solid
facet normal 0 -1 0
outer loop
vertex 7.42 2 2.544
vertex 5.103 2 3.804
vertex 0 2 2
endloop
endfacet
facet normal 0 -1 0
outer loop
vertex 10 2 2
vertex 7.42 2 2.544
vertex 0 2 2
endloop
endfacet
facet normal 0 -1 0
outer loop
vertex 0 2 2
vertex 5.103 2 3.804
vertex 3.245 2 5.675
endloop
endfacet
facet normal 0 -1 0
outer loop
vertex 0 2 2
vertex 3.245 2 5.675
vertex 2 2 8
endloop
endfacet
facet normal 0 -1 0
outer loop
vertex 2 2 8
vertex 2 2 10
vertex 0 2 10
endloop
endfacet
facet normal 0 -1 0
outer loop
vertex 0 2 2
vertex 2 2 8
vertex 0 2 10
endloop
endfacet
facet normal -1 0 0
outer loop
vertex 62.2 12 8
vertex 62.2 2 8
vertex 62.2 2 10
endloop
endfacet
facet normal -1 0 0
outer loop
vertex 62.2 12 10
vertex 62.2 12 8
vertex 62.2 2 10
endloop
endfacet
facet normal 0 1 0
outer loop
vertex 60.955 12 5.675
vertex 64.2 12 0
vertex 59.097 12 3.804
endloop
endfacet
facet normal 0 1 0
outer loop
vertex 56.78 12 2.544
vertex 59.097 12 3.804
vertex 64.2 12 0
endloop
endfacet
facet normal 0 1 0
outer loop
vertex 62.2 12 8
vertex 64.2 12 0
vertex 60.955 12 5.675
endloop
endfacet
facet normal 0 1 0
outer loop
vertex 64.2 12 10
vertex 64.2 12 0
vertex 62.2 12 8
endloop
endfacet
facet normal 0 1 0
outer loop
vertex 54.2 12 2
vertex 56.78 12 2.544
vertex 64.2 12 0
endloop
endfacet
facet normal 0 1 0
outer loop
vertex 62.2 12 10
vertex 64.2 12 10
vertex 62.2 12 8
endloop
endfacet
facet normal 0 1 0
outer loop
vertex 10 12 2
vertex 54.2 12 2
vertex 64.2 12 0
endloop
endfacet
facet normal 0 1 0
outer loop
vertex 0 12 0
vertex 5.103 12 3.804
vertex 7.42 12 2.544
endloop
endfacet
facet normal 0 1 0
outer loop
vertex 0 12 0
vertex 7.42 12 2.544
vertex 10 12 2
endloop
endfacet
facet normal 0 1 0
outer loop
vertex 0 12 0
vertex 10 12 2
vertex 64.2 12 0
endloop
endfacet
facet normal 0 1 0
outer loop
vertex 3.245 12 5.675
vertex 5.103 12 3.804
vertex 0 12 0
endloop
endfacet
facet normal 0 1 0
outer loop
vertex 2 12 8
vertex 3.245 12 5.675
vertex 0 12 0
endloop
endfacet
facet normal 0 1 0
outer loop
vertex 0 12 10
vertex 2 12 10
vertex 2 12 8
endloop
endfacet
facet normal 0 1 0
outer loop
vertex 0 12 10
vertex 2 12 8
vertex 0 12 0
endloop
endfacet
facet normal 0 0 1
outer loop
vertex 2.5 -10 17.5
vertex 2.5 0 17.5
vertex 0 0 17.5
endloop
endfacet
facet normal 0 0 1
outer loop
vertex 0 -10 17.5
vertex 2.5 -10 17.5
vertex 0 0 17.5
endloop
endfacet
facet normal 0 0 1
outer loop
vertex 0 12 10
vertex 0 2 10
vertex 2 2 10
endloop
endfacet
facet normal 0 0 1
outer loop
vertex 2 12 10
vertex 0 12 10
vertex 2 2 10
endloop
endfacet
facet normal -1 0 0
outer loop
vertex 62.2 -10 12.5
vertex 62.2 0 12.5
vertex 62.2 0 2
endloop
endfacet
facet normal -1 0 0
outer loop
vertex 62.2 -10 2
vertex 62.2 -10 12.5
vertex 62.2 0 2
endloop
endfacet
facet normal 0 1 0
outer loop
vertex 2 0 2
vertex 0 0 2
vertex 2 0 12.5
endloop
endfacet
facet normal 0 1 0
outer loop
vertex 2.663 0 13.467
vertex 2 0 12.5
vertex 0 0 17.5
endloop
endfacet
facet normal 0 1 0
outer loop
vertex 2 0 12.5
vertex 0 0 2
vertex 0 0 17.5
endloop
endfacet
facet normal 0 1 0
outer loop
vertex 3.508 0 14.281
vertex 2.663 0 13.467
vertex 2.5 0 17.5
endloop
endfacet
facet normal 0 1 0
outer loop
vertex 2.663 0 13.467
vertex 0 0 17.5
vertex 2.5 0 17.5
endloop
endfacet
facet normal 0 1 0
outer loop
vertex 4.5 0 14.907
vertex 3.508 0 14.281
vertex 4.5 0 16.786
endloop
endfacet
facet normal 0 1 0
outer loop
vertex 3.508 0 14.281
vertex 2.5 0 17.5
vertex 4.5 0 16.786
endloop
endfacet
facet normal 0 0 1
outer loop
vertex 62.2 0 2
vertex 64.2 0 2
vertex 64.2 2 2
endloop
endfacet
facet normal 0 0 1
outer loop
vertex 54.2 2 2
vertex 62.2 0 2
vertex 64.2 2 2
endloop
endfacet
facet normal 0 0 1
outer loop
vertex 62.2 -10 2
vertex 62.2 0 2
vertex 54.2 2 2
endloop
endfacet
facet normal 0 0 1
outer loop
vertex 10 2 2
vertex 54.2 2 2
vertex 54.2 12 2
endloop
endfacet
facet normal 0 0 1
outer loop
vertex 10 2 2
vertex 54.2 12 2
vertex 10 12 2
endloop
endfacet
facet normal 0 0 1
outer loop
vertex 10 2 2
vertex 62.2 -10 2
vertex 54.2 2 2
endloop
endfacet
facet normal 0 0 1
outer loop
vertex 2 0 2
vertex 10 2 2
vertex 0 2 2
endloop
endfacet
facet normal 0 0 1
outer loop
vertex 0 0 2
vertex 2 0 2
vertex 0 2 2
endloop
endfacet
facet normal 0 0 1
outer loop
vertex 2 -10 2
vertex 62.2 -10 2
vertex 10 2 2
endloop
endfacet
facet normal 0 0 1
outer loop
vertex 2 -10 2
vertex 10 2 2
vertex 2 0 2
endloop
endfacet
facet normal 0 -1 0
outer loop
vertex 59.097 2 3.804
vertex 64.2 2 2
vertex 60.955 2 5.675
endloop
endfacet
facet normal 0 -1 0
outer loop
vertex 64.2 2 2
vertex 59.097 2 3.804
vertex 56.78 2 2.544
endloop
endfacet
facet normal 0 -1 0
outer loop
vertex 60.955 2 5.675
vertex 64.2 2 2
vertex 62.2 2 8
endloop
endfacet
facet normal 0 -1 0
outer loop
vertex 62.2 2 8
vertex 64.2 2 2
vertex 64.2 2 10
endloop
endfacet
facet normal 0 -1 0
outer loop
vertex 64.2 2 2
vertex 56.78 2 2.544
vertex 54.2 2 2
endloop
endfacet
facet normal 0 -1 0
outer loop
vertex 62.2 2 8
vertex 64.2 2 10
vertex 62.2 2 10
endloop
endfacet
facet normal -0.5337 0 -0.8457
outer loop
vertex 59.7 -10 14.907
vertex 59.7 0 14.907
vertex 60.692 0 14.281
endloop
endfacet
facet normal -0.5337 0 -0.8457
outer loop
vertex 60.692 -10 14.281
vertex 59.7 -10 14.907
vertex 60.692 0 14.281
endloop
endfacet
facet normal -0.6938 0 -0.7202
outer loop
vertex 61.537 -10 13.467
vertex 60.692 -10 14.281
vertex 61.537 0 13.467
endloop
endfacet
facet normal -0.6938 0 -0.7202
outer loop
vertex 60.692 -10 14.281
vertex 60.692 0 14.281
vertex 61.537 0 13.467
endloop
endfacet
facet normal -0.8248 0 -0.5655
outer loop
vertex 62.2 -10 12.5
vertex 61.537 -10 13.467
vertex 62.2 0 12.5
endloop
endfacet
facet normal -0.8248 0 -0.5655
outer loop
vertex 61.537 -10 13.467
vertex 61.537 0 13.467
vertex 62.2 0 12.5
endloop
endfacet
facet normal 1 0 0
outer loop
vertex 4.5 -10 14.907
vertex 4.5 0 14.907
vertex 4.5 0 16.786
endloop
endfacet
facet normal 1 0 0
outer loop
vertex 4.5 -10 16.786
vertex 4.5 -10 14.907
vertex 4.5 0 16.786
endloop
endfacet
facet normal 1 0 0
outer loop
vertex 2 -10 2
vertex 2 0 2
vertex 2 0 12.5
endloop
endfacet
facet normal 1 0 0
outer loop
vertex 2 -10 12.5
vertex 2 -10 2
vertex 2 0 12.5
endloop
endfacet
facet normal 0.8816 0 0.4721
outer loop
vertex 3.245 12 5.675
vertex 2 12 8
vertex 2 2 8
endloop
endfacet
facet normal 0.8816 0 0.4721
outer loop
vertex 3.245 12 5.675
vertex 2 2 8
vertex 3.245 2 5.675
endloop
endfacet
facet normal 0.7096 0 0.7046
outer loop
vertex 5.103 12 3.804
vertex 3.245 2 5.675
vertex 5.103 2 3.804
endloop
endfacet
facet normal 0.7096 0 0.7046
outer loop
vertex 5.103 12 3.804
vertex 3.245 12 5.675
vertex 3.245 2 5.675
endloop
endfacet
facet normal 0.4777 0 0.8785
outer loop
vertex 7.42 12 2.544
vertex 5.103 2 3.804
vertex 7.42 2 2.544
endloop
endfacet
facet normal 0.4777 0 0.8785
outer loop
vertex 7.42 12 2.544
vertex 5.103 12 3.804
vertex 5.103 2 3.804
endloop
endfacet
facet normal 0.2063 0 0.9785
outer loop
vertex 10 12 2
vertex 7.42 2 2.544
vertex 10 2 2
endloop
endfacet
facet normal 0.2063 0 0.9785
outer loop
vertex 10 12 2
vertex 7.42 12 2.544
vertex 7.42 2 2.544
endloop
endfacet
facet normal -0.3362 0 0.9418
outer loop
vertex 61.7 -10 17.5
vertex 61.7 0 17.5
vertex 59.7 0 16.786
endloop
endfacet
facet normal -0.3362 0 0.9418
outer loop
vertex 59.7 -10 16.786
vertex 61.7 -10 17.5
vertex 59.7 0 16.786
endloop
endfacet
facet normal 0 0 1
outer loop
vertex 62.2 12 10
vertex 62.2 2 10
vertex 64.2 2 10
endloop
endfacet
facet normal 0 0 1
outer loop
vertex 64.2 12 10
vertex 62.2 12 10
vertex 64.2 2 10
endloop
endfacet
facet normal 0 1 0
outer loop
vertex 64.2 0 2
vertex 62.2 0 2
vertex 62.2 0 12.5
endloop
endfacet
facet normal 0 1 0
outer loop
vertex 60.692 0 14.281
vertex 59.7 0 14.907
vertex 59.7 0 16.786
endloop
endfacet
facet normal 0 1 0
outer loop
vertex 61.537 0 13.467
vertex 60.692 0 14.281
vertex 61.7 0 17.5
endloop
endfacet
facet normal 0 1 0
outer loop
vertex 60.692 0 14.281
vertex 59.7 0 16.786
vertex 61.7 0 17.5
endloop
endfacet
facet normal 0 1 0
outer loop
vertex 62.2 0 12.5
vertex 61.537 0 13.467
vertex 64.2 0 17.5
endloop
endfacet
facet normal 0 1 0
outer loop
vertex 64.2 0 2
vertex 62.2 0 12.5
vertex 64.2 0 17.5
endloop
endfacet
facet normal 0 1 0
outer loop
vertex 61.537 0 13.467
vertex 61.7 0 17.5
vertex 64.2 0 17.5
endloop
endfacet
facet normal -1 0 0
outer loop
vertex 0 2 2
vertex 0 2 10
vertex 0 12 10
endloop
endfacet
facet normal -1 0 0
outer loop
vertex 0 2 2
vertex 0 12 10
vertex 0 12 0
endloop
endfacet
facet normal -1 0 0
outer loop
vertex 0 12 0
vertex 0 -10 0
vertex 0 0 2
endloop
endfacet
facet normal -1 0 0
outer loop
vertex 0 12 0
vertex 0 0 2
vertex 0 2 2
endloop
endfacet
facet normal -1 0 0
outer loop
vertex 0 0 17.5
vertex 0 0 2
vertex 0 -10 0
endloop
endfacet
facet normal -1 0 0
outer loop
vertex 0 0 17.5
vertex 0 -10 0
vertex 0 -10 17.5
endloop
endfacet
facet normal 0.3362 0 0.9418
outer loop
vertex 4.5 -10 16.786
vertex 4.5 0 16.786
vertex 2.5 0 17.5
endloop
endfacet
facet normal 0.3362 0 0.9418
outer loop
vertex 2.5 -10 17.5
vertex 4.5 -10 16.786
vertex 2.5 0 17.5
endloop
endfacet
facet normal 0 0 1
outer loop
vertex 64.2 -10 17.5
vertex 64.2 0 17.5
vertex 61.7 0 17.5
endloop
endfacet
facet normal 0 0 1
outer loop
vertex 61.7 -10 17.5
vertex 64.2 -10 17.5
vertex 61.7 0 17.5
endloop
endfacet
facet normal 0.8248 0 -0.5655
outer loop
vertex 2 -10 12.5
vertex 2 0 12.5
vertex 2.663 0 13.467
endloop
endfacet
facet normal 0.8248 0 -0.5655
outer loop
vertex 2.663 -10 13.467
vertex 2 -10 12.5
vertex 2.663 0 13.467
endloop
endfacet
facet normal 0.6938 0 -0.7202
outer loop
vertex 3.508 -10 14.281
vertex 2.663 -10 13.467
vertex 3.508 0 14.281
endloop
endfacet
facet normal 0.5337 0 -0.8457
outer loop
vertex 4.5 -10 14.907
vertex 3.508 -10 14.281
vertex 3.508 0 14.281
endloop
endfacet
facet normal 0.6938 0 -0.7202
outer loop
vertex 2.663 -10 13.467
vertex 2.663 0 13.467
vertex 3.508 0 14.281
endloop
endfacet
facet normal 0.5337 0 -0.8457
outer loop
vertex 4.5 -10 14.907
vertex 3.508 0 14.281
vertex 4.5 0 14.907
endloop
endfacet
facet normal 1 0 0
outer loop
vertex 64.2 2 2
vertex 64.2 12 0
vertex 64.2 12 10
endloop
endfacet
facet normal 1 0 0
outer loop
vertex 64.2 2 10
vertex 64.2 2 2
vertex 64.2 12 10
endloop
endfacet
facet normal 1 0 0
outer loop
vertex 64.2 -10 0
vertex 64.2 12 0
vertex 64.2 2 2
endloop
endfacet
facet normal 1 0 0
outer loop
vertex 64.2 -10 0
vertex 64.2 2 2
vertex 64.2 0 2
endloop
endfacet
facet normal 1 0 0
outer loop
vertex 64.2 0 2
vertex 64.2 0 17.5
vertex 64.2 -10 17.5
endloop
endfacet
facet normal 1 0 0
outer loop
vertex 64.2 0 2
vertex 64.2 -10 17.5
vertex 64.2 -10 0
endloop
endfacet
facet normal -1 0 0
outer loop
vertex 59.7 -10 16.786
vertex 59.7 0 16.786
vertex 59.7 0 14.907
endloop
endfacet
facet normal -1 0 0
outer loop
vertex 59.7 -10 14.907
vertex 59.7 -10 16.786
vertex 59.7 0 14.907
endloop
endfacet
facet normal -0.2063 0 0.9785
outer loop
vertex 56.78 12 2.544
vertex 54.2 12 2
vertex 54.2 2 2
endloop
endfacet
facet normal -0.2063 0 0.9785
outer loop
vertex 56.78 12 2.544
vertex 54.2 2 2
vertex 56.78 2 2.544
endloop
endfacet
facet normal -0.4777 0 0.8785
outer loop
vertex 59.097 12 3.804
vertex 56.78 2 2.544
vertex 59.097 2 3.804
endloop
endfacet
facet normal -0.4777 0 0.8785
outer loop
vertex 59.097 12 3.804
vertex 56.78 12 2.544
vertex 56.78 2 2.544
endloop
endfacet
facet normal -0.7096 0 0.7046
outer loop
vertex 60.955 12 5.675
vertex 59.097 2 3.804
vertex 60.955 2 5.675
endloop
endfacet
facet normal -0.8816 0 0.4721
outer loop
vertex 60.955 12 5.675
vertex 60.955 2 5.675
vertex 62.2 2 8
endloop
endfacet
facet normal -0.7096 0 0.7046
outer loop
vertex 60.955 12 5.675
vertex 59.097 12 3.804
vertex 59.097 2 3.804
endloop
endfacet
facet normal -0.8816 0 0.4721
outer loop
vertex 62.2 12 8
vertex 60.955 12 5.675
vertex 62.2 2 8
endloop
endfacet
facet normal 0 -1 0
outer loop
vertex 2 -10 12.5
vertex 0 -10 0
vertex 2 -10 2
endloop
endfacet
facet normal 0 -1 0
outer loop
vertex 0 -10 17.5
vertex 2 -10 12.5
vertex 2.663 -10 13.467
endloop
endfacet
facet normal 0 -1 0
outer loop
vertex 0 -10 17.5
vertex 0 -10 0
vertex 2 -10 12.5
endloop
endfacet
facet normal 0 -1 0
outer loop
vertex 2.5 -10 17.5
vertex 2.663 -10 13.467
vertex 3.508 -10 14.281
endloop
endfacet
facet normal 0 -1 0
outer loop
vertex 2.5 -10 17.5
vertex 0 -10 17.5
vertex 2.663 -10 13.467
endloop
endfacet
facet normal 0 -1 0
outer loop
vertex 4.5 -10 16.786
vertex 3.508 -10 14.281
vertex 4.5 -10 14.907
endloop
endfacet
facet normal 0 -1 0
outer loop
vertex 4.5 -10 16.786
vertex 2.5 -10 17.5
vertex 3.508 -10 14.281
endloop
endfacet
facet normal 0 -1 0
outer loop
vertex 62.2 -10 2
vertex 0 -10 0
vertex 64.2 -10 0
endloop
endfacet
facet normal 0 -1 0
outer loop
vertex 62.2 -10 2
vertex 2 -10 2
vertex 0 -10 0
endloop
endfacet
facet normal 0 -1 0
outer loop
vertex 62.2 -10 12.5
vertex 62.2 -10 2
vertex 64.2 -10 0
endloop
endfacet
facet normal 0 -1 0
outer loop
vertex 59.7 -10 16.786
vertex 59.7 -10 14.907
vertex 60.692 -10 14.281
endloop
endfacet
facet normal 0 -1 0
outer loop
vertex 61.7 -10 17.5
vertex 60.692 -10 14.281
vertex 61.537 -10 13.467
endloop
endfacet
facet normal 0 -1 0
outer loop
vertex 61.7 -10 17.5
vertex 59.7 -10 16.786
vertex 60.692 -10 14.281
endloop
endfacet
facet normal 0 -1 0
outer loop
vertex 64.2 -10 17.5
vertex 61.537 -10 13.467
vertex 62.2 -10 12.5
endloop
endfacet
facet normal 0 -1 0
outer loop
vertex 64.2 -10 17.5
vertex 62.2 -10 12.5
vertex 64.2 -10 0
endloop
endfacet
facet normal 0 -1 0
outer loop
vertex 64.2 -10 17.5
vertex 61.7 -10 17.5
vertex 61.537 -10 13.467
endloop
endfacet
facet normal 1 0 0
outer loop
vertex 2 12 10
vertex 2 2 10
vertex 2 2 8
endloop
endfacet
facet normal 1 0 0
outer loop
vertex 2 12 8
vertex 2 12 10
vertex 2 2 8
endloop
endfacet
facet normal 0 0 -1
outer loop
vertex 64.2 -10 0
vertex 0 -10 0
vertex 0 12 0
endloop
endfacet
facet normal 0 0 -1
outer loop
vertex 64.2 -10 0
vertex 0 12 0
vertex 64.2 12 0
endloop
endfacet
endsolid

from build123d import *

# Parameters (mm, degrees)
F1_DEPTH = 10
F2_DEPTH = 12
F4_DEPTH = 10


# Not quite as in the source:
# - ends of sketch curves that miss each other by under 0.0002 mm in the source are joined


with BuildPart() as f1:
    # F0 (on Front) → F1 (new body)
    with BuildSketch(Plane.XZ):
        Polygon((0, 2), (0, 0), (64.2, 0), (64.2, 2), (62.2, 2), (2, 2), align=None)
        with BuildLine():
            Line((0, 17.5), (0, 2))
            Line((0, 2), (2, 2))
            Line((2, 2), (2, 12.5))
            ThreePointArc((2, 12.5), (3.0649650296, 13.8955071669), (4.5, 14.9065785791))
            Line((4.5, 14.9065785791), (4.5, 16.7855147476))
            Line((4.5, 16.7855147476), (2.5, 17.5))
            Line((2.5, 17.5), (0, 17.5))
        make_face()
        with BuildLine():
            Line((62.2, 2), (64.2, 2))
            Line((64.2, 2), (64.2, 17.5))
            Line((64.2, 17.5), (61.7, 17.5))
            Line((61.7, 17.5), (59.7, 16.7855148221))
            Line((59.7, 16.7855148221), (59.7, 14.9065787654))
            ThreePointArc((59.7, 14.9065787654), (61.1350349704, 13.8955073531), (62.2, 12.5000001863))
            Line((62.2, 12.5000001863), (62.2, 2))
        make_face()
    extrude(amount=F1_DEPTH)

    # F0 (on Front) → F2 (join)
    with BuildSketch(Plane.XZ):
        Polygon((0, 2), (0, 0), (64.2, 0), (64.2, 2), (62.2, 2), (2, 2), align=None)
    extrude(amount=-F2_DEPTH)

    # F3 (on face) → F4 (join)
    with BuildSketch(Plane(origin=(0, 12, 0), x_dir=(-1, 0, 0), z_dir=(0, 1, 0))):
        with BuildLine():
            Line((-64.2, 2), (-54.2, 2))
            ThreePointArc((-54.2, 2), (-59.0968473433, 3.8042035422), (-62.2, 8))
            Line((-62.2, 8), (-62.2, 10))
            Line((-62.2, 10), (-64.2, 10))
            Line((-64.2, 10), (-64.2, 2))
        make_face()
        with BuildLine():
            Line((-10, 2), (0, 2))
            Line((0, 2), (0, 10))
            Line((0, 10), (-2, 10))
            Line((-2, 10), (-2, 8))
            ThreePointArc((-2, 8), (-5.1031526567, 3.8042035422), (-10, 2))
        make_face()
    extrude(amount=-F4_DEPTH)


solid = f1.part
